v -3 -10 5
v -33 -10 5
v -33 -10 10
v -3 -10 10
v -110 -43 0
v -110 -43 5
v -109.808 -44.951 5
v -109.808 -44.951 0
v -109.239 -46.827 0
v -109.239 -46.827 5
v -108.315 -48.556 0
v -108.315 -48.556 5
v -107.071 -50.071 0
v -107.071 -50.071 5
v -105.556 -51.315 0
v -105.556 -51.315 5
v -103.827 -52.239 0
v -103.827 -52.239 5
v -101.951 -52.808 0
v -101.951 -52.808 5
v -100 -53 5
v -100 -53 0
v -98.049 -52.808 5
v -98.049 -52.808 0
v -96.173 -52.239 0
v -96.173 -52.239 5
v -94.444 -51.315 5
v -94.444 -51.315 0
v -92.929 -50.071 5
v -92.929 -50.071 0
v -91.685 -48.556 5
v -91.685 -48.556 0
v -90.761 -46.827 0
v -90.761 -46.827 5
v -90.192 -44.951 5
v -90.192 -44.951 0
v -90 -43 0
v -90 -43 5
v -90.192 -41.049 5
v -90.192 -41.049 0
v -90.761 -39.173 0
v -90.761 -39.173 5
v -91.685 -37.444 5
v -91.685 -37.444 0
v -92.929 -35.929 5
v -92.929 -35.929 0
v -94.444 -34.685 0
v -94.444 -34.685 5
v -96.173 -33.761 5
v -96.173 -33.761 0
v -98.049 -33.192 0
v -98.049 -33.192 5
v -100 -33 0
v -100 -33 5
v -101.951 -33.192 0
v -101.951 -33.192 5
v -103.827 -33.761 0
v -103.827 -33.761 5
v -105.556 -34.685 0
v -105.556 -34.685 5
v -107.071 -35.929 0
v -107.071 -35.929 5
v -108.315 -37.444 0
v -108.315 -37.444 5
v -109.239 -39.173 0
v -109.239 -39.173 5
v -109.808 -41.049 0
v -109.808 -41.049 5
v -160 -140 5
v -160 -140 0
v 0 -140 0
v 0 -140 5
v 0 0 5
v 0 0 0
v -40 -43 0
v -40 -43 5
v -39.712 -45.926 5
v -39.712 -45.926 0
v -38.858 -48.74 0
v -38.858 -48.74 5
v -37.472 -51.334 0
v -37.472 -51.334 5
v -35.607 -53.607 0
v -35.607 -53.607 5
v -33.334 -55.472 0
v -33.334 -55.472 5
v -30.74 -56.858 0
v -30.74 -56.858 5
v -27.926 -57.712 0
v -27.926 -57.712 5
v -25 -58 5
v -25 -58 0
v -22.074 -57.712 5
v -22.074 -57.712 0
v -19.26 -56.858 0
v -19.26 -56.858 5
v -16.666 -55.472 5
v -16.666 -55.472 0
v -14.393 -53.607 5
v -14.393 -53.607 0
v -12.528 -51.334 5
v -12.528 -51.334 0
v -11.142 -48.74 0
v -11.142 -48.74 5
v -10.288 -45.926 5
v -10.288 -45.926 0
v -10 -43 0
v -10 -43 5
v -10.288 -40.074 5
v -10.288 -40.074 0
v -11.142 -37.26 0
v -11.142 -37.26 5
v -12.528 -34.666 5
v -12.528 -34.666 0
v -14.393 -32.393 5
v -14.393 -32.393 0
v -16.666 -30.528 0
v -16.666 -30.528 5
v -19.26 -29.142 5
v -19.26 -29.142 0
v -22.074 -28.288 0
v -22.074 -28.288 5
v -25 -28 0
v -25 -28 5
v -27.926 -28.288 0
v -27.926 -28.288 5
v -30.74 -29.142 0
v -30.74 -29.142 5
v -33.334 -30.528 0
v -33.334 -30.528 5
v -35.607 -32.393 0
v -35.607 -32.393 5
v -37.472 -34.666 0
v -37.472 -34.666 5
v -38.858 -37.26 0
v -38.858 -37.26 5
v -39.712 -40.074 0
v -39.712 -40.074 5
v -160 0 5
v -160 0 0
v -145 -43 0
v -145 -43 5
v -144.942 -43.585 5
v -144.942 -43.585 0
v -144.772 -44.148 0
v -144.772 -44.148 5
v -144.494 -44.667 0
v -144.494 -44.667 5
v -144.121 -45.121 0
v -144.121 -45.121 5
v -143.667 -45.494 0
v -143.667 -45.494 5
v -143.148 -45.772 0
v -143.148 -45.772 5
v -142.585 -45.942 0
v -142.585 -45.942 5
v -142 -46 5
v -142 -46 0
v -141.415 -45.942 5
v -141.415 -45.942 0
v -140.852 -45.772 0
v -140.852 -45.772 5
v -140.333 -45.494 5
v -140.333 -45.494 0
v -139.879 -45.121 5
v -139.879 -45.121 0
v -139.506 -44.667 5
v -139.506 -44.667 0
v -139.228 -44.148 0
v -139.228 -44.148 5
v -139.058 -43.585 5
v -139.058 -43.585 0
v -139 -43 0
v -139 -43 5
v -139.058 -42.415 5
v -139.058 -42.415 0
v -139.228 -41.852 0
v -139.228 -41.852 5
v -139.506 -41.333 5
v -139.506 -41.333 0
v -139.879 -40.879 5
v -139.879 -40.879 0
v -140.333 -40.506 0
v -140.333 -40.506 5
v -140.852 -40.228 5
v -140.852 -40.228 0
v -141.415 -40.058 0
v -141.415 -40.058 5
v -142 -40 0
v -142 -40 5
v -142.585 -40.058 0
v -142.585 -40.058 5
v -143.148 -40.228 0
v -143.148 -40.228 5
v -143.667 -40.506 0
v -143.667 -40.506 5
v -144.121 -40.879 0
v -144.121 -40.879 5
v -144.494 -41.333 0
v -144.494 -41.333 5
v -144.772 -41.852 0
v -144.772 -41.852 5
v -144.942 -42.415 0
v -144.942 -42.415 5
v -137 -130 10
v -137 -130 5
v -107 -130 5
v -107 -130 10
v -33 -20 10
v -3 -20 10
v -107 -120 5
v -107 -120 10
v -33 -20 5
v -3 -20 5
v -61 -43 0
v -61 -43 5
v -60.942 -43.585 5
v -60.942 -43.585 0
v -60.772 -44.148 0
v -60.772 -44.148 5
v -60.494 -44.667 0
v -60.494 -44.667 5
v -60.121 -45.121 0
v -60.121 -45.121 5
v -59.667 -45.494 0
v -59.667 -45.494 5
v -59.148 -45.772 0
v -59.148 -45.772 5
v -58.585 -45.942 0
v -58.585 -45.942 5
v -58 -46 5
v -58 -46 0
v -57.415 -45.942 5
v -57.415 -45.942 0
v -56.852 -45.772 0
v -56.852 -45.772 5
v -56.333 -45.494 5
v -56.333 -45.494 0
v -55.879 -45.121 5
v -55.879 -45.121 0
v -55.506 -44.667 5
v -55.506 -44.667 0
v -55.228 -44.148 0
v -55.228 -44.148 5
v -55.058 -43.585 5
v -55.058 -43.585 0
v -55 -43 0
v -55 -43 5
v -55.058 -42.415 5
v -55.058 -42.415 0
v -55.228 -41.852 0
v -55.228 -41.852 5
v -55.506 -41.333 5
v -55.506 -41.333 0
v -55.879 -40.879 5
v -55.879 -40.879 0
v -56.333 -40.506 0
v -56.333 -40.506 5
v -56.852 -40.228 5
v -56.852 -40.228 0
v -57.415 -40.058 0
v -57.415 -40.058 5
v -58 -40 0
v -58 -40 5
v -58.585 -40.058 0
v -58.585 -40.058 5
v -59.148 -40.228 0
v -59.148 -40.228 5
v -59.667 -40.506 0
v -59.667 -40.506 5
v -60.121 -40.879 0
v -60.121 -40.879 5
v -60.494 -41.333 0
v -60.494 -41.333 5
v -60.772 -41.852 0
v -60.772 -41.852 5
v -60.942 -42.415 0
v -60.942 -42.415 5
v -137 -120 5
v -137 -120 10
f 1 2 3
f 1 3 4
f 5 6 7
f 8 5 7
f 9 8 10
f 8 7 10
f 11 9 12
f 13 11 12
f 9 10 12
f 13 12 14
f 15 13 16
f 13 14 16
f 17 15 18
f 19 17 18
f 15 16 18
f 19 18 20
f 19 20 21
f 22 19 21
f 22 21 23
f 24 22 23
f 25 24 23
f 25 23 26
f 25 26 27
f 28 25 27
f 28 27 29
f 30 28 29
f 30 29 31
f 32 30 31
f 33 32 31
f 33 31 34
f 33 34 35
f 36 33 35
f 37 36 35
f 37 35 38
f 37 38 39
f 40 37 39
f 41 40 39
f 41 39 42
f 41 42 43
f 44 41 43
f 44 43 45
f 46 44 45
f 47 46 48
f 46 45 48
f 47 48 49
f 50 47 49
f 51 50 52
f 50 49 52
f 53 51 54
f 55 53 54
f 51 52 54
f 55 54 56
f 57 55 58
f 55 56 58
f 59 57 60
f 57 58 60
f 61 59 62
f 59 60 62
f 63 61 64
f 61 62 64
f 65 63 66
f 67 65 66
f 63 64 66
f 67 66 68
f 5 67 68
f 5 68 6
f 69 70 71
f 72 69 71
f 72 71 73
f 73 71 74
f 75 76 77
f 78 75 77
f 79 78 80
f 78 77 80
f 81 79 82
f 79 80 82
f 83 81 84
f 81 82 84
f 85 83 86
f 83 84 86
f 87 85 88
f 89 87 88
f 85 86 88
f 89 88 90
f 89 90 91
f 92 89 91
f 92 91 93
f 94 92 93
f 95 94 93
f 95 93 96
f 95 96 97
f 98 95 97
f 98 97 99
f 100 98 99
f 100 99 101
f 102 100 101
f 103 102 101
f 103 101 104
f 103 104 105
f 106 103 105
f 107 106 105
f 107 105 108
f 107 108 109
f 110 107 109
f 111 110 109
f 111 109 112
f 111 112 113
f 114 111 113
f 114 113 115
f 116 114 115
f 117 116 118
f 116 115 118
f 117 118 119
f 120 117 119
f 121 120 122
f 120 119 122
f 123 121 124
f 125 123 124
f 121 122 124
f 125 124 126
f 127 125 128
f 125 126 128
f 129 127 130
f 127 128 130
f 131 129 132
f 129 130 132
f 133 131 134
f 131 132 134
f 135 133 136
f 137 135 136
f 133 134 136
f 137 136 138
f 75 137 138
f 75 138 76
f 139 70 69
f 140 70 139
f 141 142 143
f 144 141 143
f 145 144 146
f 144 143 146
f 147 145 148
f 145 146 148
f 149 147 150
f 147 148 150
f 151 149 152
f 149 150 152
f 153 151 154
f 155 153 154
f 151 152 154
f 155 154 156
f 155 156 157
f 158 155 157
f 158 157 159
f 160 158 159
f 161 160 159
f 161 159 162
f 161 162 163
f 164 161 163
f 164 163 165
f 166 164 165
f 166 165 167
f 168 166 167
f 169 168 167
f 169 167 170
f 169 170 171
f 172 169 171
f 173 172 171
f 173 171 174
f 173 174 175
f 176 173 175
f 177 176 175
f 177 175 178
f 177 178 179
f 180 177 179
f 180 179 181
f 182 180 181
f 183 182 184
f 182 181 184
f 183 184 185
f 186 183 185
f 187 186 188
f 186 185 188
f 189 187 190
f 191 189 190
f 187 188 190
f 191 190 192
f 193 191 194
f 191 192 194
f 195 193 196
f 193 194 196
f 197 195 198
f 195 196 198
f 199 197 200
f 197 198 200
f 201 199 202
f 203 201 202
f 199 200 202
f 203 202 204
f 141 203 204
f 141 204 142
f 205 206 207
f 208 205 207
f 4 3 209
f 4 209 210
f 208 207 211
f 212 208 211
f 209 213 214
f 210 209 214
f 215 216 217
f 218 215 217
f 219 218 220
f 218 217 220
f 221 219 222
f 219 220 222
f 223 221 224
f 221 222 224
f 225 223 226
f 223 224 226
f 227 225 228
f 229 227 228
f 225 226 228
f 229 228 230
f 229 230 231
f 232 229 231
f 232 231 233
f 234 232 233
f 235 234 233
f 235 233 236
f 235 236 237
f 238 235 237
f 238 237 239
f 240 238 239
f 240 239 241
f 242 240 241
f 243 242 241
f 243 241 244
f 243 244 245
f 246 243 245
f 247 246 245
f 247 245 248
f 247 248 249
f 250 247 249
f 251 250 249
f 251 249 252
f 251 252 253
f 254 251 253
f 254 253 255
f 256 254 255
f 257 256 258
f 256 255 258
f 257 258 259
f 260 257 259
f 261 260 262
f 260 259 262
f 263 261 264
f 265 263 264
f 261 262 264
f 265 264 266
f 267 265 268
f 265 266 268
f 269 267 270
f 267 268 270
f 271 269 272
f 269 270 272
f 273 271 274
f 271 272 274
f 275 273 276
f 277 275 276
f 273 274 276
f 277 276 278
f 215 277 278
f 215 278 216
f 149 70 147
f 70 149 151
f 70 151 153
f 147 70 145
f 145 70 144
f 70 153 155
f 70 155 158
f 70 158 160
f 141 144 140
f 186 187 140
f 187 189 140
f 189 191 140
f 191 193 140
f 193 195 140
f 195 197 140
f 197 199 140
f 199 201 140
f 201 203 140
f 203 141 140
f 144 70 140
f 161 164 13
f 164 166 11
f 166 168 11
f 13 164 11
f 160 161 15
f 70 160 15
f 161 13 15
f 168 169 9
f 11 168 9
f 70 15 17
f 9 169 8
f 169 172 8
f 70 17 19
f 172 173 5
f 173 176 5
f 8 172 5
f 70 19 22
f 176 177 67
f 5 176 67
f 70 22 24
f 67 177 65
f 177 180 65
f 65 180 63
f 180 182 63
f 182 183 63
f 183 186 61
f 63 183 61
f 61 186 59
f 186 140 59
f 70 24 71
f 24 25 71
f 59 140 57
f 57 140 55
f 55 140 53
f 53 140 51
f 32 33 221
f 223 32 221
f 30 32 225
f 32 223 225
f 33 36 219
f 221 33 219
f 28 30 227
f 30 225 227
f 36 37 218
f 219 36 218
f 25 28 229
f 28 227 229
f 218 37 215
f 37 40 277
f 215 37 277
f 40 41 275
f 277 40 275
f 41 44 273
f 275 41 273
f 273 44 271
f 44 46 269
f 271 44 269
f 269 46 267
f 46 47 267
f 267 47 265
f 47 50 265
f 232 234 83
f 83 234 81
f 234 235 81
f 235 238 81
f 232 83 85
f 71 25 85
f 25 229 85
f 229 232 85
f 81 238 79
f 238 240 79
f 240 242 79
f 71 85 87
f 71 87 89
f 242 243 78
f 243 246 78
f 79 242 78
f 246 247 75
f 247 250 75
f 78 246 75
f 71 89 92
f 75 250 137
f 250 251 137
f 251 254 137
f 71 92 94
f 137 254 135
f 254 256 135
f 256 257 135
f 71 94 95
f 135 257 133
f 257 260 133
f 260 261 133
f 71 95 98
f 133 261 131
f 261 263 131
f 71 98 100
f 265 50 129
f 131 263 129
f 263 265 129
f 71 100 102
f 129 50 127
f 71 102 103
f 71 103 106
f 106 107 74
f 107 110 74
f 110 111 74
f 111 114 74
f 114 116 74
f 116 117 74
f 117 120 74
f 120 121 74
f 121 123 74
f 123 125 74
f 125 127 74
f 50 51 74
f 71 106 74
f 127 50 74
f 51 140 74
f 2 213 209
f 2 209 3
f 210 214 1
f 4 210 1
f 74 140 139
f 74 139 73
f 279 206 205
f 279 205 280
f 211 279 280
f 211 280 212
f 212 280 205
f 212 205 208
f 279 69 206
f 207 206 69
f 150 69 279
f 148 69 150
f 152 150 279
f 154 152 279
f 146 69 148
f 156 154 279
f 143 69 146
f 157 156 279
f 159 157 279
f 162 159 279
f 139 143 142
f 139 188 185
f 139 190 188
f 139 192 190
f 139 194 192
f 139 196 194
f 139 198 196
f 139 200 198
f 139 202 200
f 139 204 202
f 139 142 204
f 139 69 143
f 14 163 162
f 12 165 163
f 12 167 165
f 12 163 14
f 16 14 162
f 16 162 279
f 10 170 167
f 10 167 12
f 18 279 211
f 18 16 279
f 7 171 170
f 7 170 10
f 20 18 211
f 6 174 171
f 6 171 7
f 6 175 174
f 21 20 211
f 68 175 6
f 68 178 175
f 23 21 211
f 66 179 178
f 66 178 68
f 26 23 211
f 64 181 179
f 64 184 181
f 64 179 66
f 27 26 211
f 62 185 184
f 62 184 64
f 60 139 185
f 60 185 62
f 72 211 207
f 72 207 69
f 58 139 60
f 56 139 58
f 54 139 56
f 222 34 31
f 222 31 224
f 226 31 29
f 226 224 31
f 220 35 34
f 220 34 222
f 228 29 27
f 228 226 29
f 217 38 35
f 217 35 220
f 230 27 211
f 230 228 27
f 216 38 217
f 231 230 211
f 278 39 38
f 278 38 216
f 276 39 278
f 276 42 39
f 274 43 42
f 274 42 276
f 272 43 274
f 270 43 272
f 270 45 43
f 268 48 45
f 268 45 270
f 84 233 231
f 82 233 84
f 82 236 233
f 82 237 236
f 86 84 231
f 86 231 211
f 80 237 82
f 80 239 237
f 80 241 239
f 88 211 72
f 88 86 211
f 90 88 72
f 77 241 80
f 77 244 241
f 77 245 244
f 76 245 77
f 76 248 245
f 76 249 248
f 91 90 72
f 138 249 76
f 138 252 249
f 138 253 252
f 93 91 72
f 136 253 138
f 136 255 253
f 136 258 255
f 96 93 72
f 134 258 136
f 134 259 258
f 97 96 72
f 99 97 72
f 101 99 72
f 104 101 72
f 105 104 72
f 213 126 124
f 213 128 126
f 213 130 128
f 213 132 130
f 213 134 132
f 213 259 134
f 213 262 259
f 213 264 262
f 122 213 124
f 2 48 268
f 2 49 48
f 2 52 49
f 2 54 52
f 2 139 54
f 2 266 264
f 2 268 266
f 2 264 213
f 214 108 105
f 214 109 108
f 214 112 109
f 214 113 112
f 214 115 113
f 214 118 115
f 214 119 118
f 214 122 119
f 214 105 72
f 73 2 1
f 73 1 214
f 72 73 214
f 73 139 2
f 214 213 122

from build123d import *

# Parameters (mm, degrees)
SKETCH1_W           = 160
SKETCH1_H           = 140
BOSS_EXTRUDE1_DEPTH = 5
SKETCH2_W           = 30
SKETCH2_H           = 10
BOSS_EXTRUDE2_DEPTH = 5
SKETCH4_R           = 3
SKETCH4_R_2         = 10
SKETCH4_R_3         = 15
CUT_EXTRUDE1_DEPTH  = 15


with BuildPart() as part:
    # Sketch1 → Boss-Extrude1 (new body)
    with BuildSketch(Plane.XY):
        with Locations((-80, -70)):
            Rectangle(SKETCH1_W, SKETCH1_H)
    extrude(amount=BOSS_EXTRUDE1_DEPTH)

    # Sketch2 → Boss-Extrude2 (add)
    with BuildSketch(Plane.XY.offset(5)):
        with Locations((-18, -15)):
            Rectangle(SKETCH2_W, SKETCH2_H)
        with Locations((-122, -125)):
            Rectangle(SKETCH2_W, SKETCH2_H)
    extrude(amount=BOSS_EXTRUDE2_DEPTH)

    # Sketch4 → Cut-Extrude1 (cut)
    with BuildSketch(Plane.XY.offset(10)):
        with Locations(Location((-142, -43, 0), (0, 0, 180))):
            Circle(SKETCH4_R)
        with Locations(Location((-100, -43, 0), (0, 0, 180))):
            Circle(SKETCH4_R_2)
        with Locations(Location((-58, -43, 0), (0, 0, 180))):
            Circle(SKETCH4_R)
        with Locations(Location((-25, -43, 0), (0, 0, 180))):
            Circle(SKETCH4_R_3)
    extrude(amount=-CUT_EXTRUDE1_DEPTH, mode=Mode.SUBTRACT)


solid = part.part
